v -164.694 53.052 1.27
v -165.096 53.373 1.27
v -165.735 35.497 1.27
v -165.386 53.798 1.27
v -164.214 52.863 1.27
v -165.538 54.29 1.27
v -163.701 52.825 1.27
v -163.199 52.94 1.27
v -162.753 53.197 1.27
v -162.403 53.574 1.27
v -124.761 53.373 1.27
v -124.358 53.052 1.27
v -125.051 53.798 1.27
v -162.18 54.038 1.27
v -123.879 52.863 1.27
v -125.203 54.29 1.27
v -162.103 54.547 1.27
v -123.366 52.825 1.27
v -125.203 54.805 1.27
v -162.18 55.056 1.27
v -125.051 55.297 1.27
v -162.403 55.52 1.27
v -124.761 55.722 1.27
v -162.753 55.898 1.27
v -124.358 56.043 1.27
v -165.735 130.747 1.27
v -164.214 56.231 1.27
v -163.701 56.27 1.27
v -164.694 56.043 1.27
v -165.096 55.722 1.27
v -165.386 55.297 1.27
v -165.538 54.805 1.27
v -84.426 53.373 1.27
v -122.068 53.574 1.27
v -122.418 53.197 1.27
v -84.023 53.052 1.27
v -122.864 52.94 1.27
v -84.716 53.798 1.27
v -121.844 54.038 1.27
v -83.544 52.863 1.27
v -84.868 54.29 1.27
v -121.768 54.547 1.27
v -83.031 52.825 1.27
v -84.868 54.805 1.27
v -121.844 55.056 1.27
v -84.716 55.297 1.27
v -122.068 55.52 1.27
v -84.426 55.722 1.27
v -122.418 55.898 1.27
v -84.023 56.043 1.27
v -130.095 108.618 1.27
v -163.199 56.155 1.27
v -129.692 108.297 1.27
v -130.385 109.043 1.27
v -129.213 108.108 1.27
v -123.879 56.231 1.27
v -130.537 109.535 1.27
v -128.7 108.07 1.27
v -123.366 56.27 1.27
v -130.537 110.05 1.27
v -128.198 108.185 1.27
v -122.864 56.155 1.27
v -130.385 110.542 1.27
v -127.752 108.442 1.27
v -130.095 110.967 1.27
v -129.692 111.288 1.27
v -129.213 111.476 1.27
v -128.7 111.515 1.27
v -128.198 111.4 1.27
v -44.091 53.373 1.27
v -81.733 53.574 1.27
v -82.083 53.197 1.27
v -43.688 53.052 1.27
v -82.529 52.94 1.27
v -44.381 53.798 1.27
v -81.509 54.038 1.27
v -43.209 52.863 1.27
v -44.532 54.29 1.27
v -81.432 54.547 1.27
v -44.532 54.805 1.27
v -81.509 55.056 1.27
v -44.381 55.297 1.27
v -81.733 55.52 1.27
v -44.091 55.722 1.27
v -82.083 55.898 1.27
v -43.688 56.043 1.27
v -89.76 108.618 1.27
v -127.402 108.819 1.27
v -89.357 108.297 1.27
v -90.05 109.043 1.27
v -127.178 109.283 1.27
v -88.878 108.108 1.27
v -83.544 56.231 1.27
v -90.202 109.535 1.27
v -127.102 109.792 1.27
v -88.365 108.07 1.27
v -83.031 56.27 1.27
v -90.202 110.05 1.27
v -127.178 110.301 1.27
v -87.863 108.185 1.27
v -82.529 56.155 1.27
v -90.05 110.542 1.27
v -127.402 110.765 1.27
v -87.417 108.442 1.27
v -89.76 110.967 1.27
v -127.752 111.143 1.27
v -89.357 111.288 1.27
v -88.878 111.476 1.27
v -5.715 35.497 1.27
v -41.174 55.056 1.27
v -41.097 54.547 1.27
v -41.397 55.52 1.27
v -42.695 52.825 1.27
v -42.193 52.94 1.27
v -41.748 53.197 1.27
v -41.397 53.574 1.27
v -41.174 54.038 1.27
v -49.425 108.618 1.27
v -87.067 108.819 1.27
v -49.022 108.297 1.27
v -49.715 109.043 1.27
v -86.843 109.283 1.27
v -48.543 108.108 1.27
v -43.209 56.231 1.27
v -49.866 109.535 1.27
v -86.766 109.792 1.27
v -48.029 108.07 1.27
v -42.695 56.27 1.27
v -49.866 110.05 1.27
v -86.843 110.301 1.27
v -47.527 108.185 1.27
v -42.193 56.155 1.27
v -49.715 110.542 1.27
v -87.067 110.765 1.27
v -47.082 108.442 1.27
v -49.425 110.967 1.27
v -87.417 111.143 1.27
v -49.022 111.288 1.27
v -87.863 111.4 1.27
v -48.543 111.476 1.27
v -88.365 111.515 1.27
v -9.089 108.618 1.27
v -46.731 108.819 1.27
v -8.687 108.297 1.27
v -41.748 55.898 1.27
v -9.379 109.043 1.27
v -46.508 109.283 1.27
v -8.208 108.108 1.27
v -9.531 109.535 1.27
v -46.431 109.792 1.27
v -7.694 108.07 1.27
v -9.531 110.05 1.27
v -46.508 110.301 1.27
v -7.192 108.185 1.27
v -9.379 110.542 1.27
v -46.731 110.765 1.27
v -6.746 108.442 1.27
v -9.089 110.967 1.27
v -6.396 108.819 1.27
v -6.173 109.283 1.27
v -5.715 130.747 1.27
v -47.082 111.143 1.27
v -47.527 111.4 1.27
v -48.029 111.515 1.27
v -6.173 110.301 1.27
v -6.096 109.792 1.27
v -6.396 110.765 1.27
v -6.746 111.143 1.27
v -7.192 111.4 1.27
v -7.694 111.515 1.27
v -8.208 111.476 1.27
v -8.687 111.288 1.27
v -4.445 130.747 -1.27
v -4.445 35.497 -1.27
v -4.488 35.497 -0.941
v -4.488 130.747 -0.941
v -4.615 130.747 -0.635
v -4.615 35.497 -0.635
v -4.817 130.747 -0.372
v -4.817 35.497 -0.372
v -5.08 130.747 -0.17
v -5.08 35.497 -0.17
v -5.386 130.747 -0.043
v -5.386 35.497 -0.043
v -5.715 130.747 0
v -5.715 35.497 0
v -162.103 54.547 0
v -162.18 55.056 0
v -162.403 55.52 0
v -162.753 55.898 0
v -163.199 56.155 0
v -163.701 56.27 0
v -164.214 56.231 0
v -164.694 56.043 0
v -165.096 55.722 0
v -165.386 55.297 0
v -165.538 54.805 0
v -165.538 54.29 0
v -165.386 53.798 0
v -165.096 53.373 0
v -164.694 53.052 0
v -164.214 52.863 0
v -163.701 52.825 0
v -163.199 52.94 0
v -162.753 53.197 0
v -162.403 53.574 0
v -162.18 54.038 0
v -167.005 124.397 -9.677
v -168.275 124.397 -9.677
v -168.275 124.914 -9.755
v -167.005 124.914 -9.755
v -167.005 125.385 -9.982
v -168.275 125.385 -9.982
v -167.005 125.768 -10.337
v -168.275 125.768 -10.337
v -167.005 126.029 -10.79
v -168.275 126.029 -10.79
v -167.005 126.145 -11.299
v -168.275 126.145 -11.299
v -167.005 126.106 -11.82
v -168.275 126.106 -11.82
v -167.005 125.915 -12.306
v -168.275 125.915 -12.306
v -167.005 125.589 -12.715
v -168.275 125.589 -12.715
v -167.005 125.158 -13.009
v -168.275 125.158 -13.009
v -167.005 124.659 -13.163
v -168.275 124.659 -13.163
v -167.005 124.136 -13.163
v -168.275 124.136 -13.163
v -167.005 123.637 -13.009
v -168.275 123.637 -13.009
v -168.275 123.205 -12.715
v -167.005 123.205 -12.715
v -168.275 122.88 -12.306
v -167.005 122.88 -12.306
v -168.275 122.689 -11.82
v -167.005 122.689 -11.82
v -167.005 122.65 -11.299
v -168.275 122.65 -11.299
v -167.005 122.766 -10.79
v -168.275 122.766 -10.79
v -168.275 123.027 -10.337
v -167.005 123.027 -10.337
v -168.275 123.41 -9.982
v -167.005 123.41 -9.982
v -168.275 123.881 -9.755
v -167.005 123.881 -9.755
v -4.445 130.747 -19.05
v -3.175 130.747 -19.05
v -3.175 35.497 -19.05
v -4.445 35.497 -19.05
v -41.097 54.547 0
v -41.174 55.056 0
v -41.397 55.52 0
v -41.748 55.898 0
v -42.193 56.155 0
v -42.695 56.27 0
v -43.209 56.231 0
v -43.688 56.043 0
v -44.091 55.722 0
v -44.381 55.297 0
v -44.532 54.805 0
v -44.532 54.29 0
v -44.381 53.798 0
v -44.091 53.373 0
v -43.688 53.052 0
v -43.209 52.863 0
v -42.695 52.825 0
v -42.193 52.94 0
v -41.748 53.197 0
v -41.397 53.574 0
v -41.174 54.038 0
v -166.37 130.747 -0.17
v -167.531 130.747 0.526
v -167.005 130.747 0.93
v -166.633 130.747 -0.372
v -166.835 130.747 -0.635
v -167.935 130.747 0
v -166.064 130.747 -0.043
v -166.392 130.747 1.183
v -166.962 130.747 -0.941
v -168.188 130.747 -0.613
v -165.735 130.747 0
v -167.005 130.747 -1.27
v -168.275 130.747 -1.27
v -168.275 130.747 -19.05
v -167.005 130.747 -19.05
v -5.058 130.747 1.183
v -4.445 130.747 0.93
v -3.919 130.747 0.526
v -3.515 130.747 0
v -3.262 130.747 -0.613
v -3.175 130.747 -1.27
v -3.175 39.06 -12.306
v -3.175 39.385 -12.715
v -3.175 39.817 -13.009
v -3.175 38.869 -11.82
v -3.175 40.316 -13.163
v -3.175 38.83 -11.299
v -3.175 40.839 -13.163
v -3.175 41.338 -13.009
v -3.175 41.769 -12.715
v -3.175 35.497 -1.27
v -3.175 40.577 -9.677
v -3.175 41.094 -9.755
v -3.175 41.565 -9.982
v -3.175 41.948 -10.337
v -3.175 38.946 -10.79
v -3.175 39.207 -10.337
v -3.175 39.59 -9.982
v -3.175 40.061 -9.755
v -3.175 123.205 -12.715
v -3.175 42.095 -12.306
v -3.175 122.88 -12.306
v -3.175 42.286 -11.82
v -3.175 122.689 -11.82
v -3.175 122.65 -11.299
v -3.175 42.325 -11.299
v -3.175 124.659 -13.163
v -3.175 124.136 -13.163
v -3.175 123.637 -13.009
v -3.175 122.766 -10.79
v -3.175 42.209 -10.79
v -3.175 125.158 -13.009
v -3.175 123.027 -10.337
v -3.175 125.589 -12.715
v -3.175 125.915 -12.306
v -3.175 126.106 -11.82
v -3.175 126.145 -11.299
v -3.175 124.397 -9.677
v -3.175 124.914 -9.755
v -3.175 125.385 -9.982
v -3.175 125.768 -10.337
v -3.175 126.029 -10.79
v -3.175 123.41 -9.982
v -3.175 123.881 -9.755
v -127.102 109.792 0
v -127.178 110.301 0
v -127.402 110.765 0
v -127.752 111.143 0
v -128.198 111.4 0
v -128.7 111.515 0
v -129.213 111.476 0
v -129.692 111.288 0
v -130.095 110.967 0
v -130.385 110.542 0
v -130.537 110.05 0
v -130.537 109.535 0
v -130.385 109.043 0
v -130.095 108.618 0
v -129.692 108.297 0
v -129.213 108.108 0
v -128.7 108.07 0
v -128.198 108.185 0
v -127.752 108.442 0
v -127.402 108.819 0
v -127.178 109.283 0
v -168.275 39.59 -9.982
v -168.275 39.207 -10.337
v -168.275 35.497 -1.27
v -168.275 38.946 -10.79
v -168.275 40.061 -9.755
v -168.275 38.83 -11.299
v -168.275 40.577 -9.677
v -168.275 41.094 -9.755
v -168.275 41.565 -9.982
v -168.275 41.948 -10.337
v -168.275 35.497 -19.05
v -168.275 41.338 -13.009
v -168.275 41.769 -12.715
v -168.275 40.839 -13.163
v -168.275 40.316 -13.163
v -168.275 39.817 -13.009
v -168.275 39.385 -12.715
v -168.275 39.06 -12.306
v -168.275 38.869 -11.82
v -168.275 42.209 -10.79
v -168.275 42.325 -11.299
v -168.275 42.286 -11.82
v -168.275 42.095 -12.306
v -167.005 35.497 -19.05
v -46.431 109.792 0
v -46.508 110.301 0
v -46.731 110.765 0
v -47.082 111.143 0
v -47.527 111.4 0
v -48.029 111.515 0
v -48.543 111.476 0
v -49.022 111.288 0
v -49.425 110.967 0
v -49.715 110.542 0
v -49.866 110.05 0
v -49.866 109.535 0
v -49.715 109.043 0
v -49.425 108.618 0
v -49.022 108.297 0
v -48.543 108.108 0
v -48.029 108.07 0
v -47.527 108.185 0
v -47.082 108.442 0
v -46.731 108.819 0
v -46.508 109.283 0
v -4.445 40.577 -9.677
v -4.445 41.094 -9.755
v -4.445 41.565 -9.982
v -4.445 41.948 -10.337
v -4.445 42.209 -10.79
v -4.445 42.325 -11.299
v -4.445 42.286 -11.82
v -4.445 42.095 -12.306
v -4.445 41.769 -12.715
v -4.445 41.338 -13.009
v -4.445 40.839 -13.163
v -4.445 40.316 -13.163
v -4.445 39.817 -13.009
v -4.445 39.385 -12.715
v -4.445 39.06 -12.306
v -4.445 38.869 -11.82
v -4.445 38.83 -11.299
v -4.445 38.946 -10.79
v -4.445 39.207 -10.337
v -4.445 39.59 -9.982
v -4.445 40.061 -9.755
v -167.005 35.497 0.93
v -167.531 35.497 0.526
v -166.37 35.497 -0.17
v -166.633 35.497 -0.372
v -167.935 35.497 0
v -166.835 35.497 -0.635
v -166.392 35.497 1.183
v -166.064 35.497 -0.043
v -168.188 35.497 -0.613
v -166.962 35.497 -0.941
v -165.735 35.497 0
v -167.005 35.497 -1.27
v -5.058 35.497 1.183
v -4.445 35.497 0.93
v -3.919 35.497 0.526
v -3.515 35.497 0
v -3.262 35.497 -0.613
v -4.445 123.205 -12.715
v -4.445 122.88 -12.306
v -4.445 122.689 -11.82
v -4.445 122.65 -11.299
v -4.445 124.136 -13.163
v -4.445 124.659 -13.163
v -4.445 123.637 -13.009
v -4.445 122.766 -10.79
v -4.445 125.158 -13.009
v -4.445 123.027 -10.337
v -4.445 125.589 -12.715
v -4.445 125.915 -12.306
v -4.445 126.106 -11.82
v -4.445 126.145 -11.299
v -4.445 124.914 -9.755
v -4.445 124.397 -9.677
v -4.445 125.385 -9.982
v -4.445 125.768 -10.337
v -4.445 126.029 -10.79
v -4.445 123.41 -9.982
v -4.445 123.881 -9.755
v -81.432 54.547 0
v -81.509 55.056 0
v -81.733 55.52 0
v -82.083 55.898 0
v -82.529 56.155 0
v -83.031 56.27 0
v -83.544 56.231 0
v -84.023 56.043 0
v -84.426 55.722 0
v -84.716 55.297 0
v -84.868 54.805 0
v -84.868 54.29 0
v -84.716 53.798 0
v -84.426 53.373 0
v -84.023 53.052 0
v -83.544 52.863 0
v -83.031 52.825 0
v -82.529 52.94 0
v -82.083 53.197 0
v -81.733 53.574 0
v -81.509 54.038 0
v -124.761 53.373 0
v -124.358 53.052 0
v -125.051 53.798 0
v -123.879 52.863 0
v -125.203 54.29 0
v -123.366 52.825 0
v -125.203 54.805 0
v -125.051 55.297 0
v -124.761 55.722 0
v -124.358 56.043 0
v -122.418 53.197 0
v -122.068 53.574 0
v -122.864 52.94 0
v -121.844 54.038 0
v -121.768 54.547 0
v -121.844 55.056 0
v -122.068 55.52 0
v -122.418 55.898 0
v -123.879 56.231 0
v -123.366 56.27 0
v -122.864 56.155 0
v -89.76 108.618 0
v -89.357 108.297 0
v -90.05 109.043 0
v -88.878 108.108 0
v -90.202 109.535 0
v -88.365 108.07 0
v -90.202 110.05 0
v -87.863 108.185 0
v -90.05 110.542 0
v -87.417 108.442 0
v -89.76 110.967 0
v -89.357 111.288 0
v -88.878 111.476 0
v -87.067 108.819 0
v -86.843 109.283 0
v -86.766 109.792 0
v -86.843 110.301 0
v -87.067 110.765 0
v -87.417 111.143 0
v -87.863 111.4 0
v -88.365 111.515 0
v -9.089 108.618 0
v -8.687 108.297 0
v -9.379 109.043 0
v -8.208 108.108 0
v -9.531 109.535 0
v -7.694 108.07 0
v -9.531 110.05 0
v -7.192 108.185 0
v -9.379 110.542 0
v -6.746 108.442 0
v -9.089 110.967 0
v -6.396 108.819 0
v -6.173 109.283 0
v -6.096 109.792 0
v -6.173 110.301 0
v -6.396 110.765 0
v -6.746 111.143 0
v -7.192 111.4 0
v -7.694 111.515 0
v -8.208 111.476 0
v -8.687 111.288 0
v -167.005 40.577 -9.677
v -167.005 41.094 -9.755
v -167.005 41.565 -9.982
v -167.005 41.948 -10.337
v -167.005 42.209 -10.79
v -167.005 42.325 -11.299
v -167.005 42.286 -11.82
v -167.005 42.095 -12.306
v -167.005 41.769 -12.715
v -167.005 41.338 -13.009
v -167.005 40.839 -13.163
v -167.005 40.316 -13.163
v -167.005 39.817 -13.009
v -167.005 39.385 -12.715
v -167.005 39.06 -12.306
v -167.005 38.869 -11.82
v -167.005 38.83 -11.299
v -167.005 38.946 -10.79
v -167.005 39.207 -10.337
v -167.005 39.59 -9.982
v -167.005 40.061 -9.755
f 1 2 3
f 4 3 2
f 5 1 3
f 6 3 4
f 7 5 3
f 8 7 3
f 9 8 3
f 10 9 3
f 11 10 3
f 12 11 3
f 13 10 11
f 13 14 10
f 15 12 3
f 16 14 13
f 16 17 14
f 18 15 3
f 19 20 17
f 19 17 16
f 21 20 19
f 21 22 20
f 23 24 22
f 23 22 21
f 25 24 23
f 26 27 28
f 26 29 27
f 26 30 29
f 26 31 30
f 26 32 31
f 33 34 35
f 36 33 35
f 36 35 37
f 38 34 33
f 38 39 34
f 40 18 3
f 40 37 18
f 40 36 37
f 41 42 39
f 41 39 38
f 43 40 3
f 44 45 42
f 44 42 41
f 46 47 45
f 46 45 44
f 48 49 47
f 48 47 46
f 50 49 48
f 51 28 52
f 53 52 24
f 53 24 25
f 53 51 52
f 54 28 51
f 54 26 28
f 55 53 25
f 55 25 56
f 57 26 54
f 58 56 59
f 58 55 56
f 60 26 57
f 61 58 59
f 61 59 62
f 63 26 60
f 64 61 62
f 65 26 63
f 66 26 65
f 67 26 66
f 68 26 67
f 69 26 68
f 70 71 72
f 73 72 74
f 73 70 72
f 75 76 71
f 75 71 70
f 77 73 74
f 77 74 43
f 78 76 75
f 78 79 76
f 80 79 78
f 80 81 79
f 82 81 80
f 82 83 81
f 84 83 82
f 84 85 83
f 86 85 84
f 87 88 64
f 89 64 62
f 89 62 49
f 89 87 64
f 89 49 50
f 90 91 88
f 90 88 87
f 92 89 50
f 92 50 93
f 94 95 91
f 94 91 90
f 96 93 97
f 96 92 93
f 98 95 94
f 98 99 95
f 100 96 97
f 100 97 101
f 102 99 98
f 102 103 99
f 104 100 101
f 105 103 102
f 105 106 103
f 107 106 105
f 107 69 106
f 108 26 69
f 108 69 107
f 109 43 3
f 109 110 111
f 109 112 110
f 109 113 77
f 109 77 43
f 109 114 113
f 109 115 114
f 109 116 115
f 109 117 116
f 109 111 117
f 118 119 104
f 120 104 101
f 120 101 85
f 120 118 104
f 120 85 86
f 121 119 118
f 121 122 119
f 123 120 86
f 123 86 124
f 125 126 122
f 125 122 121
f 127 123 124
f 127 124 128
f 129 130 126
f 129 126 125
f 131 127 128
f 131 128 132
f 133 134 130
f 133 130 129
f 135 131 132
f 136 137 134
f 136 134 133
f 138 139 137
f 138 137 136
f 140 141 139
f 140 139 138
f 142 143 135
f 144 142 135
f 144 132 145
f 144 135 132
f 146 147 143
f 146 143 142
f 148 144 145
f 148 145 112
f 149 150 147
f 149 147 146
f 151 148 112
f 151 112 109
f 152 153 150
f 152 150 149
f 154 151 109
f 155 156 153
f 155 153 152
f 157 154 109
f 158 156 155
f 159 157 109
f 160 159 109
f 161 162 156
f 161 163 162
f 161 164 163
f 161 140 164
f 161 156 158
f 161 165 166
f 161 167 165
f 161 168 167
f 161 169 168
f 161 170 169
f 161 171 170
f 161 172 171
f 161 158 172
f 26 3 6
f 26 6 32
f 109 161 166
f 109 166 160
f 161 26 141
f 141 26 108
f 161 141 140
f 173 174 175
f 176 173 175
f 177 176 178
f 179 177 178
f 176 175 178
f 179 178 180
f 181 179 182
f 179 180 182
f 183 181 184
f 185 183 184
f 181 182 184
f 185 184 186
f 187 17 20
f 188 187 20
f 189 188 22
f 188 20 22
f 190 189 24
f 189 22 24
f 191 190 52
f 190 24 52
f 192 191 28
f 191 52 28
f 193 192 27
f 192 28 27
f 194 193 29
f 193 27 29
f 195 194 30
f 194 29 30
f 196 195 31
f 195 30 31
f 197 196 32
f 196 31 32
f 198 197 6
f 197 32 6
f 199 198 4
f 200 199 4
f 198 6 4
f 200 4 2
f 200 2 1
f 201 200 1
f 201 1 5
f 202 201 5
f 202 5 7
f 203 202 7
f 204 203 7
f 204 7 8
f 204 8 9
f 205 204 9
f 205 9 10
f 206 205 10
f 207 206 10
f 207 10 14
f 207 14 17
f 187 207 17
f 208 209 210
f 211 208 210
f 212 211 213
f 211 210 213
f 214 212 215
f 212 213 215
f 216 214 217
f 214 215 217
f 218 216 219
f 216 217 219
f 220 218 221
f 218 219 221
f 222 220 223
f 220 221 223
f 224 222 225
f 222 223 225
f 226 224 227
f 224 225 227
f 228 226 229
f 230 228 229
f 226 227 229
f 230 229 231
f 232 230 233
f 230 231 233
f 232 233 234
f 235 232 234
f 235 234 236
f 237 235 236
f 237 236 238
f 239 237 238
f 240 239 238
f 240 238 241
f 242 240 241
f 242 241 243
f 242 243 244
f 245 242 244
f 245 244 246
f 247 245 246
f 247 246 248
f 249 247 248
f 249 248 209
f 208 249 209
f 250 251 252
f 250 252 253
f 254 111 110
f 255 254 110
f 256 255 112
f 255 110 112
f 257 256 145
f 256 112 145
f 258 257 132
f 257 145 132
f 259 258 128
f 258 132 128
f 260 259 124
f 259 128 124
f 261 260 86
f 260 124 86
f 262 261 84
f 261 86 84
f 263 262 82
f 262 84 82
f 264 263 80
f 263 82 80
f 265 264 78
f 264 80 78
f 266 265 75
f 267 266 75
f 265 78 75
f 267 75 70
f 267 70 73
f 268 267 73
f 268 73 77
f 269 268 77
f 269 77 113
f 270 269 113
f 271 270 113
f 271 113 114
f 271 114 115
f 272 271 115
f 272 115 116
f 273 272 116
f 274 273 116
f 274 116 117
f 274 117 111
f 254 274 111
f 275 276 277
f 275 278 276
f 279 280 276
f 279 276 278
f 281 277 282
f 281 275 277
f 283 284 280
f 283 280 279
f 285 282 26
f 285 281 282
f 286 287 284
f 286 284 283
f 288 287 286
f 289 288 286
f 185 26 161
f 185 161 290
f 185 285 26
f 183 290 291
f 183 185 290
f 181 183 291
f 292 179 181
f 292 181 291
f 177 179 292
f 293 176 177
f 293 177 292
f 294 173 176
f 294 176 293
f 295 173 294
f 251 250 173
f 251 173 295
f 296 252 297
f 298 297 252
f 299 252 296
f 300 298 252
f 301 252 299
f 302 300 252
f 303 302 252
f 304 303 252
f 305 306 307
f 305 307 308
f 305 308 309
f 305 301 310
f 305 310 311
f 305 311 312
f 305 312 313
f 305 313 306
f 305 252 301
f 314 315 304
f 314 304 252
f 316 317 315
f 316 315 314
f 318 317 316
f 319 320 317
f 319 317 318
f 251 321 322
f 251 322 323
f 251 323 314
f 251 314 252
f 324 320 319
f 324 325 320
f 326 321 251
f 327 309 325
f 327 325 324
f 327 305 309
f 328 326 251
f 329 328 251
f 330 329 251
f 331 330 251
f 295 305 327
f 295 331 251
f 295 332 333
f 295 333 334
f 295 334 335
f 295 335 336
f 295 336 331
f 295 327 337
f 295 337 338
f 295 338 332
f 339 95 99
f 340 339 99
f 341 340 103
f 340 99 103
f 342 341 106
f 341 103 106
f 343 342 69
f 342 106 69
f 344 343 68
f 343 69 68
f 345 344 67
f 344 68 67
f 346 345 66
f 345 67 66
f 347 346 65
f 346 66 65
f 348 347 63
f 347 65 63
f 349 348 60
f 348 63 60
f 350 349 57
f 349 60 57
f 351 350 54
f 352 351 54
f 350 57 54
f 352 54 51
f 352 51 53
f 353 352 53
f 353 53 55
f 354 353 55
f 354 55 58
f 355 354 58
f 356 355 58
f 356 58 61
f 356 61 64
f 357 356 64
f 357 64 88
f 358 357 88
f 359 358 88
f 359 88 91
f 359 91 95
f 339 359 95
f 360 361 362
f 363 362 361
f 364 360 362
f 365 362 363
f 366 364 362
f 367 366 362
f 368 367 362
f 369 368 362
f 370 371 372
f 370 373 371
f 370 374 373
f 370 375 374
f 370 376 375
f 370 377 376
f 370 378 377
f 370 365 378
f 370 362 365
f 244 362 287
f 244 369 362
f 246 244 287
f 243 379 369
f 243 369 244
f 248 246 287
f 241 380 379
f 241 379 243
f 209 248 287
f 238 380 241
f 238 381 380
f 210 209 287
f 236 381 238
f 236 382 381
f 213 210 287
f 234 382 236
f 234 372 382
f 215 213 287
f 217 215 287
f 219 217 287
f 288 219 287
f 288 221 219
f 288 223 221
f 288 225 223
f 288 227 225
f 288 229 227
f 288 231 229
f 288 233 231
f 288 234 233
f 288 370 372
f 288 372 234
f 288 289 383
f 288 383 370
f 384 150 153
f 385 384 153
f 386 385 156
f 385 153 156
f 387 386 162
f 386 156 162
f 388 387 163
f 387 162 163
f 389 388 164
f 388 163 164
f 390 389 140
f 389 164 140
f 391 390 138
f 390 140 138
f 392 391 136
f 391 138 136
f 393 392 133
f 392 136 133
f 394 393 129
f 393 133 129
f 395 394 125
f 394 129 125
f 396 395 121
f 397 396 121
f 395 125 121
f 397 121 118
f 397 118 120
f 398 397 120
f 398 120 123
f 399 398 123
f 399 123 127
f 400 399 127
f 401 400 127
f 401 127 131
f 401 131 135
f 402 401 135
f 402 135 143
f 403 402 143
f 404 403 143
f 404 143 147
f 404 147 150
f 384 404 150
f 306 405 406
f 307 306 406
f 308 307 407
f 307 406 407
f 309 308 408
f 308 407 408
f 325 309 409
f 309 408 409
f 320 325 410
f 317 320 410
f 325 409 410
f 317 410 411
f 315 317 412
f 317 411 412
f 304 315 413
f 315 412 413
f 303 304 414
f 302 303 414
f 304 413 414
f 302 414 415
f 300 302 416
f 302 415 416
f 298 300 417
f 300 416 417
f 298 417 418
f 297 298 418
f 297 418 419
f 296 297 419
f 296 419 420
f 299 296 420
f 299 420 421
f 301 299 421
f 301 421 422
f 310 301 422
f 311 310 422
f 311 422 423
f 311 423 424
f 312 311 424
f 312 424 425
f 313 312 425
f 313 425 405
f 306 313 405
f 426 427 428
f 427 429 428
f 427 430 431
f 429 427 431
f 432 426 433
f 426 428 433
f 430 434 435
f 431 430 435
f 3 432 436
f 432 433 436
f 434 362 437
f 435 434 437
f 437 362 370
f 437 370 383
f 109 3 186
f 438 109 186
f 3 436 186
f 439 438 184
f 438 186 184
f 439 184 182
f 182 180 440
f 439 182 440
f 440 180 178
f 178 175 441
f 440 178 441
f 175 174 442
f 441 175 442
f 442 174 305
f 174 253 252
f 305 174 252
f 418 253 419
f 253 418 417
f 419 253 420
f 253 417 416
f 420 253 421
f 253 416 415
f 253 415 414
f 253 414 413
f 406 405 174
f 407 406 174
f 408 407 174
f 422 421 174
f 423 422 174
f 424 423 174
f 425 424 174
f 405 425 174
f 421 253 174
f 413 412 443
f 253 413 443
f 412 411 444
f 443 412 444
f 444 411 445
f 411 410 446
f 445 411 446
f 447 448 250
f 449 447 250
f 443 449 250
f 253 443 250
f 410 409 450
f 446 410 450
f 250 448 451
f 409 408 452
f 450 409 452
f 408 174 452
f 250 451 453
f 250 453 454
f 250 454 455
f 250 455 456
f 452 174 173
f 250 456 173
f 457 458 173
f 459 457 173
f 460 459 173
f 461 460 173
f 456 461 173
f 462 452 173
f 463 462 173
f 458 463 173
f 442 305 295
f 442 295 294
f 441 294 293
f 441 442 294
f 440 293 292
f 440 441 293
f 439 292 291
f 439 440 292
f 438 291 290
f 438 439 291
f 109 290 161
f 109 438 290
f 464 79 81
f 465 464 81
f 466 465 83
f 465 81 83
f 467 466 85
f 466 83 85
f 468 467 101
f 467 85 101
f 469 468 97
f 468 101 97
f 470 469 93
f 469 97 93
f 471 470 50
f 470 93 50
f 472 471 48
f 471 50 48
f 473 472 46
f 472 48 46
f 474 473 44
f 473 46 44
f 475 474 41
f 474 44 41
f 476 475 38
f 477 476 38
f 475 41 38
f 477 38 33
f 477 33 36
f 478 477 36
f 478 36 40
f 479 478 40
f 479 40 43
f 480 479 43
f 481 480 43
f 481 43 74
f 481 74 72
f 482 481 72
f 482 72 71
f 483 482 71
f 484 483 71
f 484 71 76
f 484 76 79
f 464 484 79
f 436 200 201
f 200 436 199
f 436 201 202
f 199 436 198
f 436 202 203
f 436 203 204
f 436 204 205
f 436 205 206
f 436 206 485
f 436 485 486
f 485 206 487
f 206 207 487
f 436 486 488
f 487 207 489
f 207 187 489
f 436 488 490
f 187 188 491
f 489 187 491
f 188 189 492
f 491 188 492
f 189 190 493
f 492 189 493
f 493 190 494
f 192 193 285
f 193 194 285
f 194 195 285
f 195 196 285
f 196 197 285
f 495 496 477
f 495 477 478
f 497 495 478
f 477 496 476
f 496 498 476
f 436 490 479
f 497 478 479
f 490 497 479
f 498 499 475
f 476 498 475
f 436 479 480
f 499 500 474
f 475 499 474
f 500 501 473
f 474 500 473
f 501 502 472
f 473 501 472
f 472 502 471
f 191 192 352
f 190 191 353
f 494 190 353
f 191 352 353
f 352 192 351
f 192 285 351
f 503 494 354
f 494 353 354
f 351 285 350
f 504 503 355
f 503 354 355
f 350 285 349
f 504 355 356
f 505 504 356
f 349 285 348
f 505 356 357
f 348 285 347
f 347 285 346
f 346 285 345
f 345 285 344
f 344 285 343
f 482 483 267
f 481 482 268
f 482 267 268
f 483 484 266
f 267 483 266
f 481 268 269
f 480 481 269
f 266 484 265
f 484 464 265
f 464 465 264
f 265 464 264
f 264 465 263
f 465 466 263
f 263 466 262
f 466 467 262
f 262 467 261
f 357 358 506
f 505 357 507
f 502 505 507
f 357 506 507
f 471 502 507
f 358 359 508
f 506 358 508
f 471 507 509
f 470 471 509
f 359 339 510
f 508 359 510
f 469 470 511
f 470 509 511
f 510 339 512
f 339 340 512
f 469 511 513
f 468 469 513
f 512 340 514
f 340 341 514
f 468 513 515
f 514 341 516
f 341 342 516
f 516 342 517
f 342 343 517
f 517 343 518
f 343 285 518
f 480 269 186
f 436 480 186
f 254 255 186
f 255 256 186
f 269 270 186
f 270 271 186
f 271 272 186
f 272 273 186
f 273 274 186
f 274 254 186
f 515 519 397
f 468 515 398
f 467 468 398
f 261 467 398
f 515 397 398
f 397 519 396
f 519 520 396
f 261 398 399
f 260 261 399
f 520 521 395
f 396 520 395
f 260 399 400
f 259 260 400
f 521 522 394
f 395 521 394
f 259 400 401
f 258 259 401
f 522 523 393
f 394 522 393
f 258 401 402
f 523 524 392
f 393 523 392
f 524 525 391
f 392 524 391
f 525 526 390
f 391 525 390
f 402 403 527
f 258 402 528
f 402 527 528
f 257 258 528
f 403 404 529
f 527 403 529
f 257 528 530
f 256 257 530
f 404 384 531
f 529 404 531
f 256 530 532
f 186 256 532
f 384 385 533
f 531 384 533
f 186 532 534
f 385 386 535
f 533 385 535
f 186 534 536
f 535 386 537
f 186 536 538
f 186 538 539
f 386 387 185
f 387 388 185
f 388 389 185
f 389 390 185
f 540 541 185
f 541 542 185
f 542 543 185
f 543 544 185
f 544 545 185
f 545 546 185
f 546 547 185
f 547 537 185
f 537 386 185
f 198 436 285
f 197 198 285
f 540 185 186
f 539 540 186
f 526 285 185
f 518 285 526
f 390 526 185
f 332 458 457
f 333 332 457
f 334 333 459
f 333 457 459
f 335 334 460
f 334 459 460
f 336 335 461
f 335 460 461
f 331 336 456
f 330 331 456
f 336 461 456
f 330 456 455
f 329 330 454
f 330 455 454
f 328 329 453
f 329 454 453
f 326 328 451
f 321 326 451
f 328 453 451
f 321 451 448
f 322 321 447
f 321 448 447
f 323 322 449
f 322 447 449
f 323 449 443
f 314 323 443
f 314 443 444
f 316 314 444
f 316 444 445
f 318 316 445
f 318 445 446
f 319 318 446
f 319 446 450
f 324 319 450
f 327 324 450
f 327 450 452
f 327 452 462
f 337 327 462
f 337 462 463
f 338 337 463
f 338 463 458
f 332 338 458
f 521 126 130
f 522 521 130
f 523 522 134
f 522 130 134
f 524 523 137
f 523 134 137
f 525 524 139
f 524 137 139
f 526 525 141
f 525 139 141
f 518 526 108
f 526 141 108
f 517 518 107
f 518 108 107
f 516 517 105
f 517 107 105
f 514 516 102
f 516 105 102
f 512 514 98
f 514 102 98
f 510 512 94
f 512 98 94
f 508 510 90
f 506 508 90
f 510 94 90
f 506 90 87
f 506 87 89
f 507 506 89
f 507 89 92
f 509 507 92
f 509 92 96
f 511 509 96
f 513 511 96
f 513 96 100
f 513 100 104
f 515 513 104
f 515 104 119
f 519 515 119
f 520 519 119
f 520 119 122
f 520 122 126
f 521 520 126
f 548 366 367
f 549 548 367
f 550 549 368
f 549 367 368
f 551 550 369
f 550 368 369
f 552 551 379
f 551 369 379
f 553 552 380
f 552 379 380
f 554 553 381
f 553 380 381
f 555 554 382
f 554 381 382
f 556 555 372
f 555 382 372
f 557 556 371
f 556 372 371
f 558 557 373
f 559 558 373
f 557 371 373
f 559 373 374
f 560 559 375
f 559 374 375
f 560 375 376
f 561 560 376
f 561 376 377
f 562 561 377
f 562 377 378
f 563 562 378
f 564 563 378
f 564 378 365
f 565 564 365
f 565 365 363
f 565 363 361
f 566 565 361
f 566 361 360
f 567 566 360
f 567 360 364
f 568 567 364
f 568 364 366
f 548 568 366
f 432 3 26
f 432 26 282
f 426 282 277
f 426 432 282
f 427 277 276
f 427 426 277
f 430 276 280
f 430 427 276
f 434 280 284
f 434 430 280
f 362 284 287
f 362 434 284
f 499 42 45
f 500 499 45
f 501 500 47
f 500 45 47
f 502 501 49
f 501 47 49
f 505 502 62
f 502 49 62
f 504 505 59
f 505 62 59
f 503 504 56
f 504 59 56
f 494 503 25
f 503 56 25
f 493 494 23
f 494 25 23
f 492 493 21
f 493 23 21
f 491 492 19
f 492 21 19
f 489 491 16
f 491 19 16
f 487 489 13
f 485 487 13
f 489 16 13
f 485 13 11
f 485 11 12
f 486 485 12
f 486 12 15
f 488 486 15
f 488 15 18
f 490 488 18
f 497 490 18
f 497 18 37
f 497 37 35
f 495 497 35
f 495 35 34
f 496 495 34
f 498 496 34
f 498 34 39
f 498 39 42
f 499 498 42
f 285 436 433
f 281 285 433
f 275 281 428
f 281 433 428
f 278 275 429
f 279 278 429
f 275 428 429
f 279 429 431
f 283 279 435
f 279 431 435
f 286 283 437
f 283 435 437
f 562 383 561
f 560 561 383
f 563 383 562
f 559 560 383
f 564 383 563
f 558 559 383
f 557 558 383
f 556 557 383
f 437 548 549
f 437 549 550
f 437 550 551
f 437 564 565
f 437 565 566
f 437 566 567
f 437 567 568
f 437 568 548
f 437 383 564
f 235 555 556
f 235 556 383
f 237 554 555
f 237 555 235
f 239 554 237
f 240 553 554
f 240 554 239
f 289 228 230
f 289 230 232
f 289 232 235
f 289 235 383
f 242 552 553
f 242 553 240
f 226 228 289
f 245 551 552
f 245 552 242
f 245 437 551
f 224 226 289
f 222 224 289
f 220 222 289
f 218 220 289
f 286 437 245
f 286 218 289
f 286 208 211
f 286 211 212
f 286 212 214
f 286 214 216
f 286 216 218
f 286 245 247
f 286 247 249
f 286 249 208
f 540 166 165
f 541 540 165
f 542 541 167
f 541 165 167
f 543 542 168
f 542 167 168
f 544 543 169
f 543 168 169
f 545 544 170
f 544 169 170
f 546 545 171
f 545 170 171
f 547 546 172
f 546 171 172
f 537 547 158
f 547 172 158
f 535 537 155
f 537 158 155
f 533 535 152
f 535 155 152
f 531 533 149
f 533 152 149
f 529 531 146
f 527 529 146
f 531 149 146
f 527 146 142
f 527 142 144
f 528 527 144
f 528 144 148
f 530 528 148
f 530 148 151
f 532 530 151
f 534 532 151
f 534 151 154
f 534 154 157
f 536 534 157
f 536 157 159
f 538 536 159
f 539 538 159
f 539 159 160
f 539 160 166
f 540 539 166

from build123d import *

# Parameters (mm, degrees)
SKETCH1_W              = 165.1
SKETCH1_H              = 95.25
BOSS_EXTRUDE1_DEPTH    = 1.27
SKETCH2_W              = 1.27
SKETCH2_H              = 95.25
BOSS_EXTRUDE2_DEPTH    = 19.05
CONVERT_SOLID1_START   = 35.497339992
CONVERT_SOLID1_DEPTH   = 95.25
CONVERT_SOLID1_2_DEPTH = 95.25
SKETCH7_R              = 1.7272
CUT_EXTRUDE1_DEPTH     = 215.065982678
SKETCH8_R              = 1.7526
CUT_EXTRUDE2_DEPTH     = 212.461058862


# Read off the part's stored shape, not the designer's step: Convert-Solid1
with BuildPart() as part:
    # Sketch1 → Boss-Extrude1 (new body)
    with BuildSketch(Plane.XY):
        with Locations((-85.725, 83.122339992)):
            Rectangle(SKETCH1_W, SKETCH1_H)
    extrude(amount=BOSS_EXTRUDE1_DEPTH)

    # Sketch2 → Boss-Extrude2 (add)
    with BuildSketch(Plane(origin=(0, 0, 0), x_dir=(-1, 0, 0), z_dir=(0, 0, -1))):
        with Locations((3.81, 83.122339992)):
            Rectangle(SKETCH2_W, SKETCH2_H)
        with Locations((167.64, 83.122339992)):
            Rectangle(SKETCH2_W, SKETCH2_H)
    extrude(amount=BOSS_EXTRUDE2_DEPTH)

    # Convert-Solid1 outline → Convert-Solid1 (cut)
    with BuildSketch(Plane(origin=(0, 0, 0), x_dir=(1, 0, 0), z_dir=(0, 1, 0)).offset(CONVERT_SOLID1_START)):
        with BuildLine():
            ThreePointArc((-3.175, 1.27), (-3.918948776, -0.526051224), (-5.715, -1.27))
            Line((-5.715, -1.27), (-3.175, -1.27))
            Line((-3.175, -1.27), (-3.175, 1.27))
        make_face()
        with BuildLine():
            ThreePointArc((-165.735, -1.27), (-167.531051224, -0.526051224), (-168.275, 1.27))
            Line((-168.275, 1.27), (-168.275, -1.27))
            Line((-168.275, -1.27), (-165.735, -1.27))
        make_face()
    extrude(amount=CONVERT_SOLID1_DEPTH, mode=Mode.SUBTRACT)

    # Convert-Solid1 2 outline → Convert-Solid1 2 (add)
    with BuildSketch(Plane(origin=(0, 0, 0), x_dir=(1, 0, 0), z_dir=(0, 1, 0)).offset(CONVERT_SOLID1_START)):
        with BuildLine():
            ThreePointArc((-4.445, 1.27), (-4.816974388, 0.371974388), (-5.715, 0))
            Line((-5.715, 0), (-4.445, 0))
            Line((-4.445, 0), (-4.445, 1.27))
        make_face()
        with BuildLine():
            ThreePointArc((-165.735, 0), (-166.633025612, 0.371974388), (-167.005, 1.27))
            Line((-167.005, 1.27), (-167.005, 0))
            Line((-167.005, 0), (-165.735, 0))
        make_face()
    extrude(amount=CONVERT_SOLID1_2_DEPTH)

    # Sketch7 → Cut-Extrude1 (cut, through all)
    with BuildSketch(Plane.XY.offset(1.27)):
        with Locations((-7.8232, 109.792339992)):
            Circle(SKETCH7_R)
        with Locations((-48.1584, 109.792339992)):
            Circle(SKETCH7_R)
        with Locations((-88.4936, 109.792339992)):
            Circle(SKETCH7_R)
        with Locations((-128.8288, 109.792339992)):
            Circle(SKETCH7_R)
        with Locations((-163.83, 54.547339992)):
            Circle(SKETCH7_R)
        with Locations((-123.4948, 54.547339992)):
            Circle(SKETCH7_R)
        with Locations((-83.1596, 54.547339992)):
            Circle(SKETCH7_R)
        with Locations((-42.8244, 54.547339992)):
            Circle(SKETCH7_R)
    extrude(amount=-CUT_EXTRUDE1_DEPTH, mode=Mode.SUBTRACT)

    # Sketch8 → Cut-Extrude2 (cut, through all)
    with BuildSketch(Plane.ZY.offset(168.275)):
        with Locations((-11.43, 40.577339992)):
            Circle(SKETCH8_R)
        with Locations((-11.43, 124.397339992)):
            Circle(SKETCH8_R)
    extrude(amount=-CUT_EXTRUDE2_DEPTH, mode=Mode.SUBTRACT)


solid = part.part
